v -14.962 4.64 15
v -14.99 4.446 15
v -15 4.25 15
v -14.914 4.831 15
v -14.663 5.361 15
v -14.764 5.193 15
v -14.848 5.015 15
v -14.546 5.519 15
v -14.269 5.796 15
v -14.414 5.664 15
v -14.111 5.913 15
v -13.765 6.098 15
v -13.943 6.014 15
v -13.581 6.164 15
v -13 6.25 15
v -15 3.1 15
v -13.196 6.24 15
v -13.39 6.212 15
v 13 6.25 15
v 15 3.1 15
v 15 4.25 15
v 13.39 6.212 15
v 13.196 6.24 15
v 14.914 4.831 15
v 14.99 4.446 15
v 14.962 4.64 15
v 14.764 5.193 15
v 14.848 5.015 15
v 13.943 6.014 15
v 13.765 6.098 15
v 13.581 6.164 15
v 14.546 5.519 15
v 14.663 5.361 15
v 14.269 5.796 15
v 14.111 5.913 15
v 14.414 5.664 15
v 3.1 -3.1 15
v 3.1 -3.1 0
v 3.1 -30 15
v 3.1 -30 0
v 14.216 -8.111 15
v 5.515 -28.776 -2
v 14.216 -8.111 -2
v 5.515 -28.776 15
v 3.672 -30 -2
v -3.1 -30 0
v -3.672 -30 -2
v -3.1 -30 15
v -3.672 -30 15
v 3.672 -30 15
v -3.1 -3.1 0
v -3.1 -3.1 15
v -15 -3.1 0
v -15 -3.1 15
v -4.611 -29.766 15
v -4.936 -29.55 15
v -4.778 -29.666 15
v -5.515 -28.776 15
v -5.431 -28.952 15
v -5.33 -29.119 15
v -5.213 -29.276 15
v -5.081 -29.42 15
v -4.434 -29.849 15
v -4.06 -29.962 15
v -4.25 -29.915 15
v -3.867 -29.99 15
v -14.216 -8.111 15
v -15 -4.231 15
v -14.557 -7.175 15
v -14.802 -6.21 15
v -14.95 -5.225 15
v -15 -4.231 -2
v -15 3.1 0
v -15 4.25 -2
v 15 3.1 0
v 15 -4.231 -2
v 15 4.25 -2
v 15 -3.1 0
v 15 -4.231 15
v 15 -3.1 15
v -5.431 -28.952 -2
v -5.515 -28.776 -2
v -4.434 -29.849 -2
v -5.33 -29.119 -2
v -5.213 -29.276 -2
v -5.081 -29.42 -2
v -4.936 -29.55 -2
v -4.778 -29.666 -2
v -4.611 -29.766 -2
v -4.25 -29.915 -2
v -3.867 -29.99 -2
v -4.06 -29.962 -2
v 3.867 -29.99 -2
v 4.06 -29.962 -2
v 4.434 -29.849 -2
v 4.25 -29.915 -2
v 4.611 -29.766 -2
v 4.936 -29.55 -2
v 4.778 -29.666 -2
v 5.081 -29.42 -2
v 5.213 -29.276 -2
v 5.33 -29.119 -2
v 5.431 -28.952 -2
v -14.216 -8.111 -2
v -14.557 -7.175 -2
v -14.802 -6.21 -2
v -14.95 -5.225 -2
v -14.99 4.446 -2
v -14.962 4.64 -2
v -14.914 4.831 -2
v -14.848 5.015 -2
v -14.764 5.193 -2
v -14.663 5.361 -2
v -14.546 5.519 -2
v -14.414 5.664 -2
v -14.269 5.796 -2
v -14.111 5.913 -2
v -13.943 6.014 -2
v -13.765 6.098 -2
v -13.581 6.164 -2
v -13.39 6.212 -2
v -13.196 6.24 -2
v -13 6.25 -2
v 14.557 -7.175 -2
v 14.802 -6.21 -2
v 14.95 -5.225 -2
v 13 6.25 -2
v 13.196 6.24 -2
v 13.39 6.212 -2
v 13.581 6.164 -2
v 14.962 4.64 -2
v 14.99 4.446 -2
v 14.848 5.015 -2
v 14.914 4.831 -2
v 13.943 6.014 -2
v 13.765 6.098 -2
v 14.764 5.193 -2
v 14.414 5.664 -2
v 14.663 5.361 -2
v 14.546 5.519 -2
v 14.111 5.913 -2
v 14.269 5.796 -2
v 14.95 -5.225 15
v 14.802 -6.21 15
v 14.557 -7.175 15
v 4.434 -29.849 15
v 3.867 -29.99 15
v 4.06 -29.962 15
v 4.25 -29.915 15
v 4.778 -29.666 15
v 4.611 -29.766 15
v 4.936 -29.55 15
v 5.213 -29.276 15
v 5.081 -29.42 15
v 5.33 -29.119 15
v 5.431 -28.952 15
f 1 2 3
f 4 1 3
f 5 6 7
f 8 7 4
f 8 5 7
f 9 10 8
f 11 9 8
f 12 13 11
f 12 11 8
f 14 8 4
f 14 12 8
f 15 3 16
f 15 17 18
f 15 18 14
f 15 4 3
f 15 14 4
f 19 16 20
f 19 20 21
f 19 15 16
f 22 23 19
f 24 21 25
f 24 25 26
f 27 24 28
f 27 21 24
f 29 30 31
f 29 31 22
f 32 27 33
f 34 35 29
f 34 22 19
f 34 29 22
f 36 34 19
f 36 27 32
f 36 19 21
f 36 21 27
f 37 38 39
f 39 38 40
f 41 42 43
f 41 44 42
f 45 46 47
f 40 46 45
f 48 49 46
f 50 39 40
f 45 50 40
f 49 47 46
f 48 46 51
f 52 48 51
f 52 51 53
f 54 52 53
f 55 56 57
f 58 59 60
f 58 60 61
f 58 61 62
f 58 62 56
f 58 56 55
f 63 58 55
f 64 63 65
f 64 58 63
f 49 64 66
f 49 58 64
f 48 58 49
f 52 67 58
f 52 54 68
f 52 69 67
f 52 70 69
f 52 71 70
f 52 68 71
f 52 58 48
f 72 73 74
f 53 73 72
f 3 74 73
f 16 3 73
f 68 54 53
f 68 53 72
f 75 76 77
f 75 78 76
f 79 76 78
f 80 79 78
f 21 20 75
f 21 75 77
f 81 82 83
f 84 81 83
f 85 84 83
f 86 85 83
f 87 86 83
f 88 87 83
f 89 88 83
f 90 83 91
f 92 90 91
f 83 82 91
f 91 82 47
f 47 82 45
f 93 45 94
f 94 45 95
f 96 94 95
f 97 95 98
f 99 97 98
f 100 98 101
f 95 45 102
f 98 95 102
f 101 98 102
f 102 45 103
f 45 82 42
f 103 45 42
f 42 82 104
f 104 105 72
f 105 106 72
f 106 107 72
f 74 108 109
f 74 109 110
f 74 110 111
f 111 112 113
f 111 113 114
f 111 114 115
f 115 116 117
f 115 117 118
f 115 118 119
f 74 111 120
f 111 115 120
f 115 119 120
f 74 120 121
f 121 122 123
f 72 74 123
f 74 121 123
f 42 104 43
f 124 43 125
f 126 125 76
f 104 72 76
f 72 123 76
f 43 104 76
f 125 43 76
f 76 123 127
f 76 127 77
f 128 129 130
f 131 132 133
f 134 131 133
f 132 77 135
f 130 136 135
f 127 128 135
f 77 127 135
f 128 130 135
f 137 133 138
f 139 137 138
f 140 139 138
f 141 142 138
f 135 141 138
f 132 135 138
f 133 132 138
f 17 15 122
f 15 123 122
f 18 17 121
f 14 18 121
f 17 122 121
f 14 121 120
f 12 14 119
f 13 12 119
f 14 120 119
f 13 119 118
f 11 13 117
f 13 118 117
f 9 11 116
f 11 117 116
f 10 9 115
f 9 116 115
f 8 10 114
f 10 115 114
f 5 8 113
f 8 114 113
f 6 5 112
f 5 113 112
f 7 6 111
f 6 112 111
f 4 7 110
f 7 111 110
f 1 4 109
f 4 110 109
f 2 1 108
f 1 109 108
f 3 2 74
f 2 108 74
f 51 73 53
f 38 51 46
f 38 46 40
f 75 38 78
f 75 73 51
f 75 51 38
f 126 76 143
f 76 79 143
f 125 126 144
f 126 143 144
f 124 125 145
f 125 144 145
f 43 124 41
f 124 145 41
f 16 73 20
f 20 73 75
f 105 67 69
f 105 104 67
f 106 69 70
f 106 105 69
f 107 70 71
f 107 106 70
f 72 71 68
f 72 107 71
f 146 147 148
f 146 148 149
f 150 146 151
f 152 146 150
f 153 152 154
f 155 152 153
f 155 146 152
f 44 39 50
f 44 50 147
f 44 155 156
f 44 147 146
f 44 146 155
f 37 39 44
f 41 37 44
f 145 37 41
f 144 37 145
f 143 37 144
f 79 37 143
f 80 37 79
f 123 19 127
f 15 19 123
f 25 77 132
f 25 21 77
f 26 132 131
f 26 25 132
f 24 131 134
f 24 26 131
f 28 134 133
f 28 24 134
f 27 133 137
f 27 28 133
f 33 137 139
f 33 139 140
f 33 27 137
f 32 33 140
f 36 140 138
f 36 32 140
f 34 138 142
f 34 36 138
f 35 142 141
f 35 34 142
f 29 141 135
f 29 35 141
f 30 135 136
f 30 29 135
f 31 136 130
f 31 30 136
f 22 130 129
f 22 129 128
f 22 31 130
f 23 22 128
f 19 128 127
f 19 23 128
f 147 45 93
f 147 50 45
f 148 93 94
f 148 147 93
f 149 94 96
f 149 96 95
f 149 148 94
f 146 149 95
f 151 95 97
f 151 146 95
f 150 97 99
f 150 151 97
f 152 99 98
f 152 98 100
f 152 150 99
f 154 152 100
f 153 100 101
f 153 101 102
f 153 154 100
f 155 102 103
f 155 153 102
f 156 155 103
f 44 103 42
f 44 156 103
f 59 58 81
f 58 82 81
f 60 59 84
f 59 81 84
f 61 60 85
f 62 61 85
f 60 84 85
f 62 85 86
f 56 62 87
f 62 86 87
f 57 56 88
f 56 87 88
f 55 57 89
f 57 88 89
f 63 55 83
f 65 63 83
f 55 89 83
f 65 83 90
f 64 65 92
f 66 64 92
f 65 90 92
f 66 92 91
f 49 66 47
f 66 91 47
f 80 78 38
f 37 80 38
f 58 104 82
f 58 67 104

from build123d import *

# Parameters (mm, degrees)
SZKIC1_W                      = 30
SZKIC1_H                      = 3.15
DODANIE_WYCI_GNI_CIE1_DEPTH   = 15
DODANIE_WYCI_GNI_CIE1_2_DEPTH = 15
DODANIE_WYCI_GNI_CIE1_3_DEPTH = 15
DODANIE_WYCI_GNI_CIE2_DEPTH   = 2
ZAOKR_GLENIE1_R               = 10
ZAOKR_GLENIE2_R               = 2


with BuildPart() as part:
    # Szkic1 → Dodanie-wyci_gni_cie1 (new body)
    with BuildSketch(Plane.XY):
        with Locations((0, 4.675)):
            Rectangle(SZKIC1_W, SZKIC1_H)
    extrude(amount=DODANIE_WYCI_GNI_CIE1_DEPTH)



with BuildPart() as body_2:
    # Szkic1 → Dodanie-wyci_gni_cie1 2 (new body)
    with BuildSketch(Plane.XY):
        Polygon((-15, -6.25), (-5, -30), (-3.1, -30), (-3.1, -3.1), (-15, -3.1), align=None)
    extrude(amount=DODANIE_WYCI_GNI_CIE1_2_DEPTH)


with BuildPart() as body_3:
    # Szkic1 → Dodanie-wyci_gni_cie1 3 (new body)
    with BuildSketch(Plane.XY):
        Polygon((3.1, -3.1), (3.1, -30), (5, -30), (15, -6.25), (15, -3.1), align=None)
    extrude(amount=DODANIE_WYCI_GNI_CIE1_3_DEPTH)


with BuildPart() as part_1:
    add(part.part)

    add(body_2.part)  # Dodanie-wyci_gni_cie2 merges body 2

    add(body_3.part)  # Dodanie-wyci_gni_cie2 merges body 3
    # Szkic1_3 → Dodanie-wyci_gni_cie2 (add)
    with BuildSketch(Plane.XY):
        Polygon((-5, -30), (5, -30), (15, -6.25), (15, 6.25), (-15, 6.25), (-15, -6.25), align=None)
    extrude(amount=-DODANIE_WYCI_GNI_CIE2_DEPTH)

    # Zaokr_glenie1
    zaokr_glenie1_edges = [part_1.edges().sort_by_distance(p)[0] for p in [
        (15, -6.25, 6.5),
        (-15, -6.25, 6.5),
    ]]
    fillet(zaokr_glenie1_edges, radius=ZAOKR_GLENIE1_R)

    # Zaokr_glenie2
    zaokr_glenie2_edges = [part_1.edges().sort_by_distance(p)[0] for p in [
        (5, -30, 6.5),
        (-5, -30, 6.5),
        (-15, 6.25, 6.5),
        (15, 6.25, 6.5),
    ]]
    fillet(zaokr_glenie2_edges, radius=ZAOKR_GLENIE2_R)


solid = part_1.part
